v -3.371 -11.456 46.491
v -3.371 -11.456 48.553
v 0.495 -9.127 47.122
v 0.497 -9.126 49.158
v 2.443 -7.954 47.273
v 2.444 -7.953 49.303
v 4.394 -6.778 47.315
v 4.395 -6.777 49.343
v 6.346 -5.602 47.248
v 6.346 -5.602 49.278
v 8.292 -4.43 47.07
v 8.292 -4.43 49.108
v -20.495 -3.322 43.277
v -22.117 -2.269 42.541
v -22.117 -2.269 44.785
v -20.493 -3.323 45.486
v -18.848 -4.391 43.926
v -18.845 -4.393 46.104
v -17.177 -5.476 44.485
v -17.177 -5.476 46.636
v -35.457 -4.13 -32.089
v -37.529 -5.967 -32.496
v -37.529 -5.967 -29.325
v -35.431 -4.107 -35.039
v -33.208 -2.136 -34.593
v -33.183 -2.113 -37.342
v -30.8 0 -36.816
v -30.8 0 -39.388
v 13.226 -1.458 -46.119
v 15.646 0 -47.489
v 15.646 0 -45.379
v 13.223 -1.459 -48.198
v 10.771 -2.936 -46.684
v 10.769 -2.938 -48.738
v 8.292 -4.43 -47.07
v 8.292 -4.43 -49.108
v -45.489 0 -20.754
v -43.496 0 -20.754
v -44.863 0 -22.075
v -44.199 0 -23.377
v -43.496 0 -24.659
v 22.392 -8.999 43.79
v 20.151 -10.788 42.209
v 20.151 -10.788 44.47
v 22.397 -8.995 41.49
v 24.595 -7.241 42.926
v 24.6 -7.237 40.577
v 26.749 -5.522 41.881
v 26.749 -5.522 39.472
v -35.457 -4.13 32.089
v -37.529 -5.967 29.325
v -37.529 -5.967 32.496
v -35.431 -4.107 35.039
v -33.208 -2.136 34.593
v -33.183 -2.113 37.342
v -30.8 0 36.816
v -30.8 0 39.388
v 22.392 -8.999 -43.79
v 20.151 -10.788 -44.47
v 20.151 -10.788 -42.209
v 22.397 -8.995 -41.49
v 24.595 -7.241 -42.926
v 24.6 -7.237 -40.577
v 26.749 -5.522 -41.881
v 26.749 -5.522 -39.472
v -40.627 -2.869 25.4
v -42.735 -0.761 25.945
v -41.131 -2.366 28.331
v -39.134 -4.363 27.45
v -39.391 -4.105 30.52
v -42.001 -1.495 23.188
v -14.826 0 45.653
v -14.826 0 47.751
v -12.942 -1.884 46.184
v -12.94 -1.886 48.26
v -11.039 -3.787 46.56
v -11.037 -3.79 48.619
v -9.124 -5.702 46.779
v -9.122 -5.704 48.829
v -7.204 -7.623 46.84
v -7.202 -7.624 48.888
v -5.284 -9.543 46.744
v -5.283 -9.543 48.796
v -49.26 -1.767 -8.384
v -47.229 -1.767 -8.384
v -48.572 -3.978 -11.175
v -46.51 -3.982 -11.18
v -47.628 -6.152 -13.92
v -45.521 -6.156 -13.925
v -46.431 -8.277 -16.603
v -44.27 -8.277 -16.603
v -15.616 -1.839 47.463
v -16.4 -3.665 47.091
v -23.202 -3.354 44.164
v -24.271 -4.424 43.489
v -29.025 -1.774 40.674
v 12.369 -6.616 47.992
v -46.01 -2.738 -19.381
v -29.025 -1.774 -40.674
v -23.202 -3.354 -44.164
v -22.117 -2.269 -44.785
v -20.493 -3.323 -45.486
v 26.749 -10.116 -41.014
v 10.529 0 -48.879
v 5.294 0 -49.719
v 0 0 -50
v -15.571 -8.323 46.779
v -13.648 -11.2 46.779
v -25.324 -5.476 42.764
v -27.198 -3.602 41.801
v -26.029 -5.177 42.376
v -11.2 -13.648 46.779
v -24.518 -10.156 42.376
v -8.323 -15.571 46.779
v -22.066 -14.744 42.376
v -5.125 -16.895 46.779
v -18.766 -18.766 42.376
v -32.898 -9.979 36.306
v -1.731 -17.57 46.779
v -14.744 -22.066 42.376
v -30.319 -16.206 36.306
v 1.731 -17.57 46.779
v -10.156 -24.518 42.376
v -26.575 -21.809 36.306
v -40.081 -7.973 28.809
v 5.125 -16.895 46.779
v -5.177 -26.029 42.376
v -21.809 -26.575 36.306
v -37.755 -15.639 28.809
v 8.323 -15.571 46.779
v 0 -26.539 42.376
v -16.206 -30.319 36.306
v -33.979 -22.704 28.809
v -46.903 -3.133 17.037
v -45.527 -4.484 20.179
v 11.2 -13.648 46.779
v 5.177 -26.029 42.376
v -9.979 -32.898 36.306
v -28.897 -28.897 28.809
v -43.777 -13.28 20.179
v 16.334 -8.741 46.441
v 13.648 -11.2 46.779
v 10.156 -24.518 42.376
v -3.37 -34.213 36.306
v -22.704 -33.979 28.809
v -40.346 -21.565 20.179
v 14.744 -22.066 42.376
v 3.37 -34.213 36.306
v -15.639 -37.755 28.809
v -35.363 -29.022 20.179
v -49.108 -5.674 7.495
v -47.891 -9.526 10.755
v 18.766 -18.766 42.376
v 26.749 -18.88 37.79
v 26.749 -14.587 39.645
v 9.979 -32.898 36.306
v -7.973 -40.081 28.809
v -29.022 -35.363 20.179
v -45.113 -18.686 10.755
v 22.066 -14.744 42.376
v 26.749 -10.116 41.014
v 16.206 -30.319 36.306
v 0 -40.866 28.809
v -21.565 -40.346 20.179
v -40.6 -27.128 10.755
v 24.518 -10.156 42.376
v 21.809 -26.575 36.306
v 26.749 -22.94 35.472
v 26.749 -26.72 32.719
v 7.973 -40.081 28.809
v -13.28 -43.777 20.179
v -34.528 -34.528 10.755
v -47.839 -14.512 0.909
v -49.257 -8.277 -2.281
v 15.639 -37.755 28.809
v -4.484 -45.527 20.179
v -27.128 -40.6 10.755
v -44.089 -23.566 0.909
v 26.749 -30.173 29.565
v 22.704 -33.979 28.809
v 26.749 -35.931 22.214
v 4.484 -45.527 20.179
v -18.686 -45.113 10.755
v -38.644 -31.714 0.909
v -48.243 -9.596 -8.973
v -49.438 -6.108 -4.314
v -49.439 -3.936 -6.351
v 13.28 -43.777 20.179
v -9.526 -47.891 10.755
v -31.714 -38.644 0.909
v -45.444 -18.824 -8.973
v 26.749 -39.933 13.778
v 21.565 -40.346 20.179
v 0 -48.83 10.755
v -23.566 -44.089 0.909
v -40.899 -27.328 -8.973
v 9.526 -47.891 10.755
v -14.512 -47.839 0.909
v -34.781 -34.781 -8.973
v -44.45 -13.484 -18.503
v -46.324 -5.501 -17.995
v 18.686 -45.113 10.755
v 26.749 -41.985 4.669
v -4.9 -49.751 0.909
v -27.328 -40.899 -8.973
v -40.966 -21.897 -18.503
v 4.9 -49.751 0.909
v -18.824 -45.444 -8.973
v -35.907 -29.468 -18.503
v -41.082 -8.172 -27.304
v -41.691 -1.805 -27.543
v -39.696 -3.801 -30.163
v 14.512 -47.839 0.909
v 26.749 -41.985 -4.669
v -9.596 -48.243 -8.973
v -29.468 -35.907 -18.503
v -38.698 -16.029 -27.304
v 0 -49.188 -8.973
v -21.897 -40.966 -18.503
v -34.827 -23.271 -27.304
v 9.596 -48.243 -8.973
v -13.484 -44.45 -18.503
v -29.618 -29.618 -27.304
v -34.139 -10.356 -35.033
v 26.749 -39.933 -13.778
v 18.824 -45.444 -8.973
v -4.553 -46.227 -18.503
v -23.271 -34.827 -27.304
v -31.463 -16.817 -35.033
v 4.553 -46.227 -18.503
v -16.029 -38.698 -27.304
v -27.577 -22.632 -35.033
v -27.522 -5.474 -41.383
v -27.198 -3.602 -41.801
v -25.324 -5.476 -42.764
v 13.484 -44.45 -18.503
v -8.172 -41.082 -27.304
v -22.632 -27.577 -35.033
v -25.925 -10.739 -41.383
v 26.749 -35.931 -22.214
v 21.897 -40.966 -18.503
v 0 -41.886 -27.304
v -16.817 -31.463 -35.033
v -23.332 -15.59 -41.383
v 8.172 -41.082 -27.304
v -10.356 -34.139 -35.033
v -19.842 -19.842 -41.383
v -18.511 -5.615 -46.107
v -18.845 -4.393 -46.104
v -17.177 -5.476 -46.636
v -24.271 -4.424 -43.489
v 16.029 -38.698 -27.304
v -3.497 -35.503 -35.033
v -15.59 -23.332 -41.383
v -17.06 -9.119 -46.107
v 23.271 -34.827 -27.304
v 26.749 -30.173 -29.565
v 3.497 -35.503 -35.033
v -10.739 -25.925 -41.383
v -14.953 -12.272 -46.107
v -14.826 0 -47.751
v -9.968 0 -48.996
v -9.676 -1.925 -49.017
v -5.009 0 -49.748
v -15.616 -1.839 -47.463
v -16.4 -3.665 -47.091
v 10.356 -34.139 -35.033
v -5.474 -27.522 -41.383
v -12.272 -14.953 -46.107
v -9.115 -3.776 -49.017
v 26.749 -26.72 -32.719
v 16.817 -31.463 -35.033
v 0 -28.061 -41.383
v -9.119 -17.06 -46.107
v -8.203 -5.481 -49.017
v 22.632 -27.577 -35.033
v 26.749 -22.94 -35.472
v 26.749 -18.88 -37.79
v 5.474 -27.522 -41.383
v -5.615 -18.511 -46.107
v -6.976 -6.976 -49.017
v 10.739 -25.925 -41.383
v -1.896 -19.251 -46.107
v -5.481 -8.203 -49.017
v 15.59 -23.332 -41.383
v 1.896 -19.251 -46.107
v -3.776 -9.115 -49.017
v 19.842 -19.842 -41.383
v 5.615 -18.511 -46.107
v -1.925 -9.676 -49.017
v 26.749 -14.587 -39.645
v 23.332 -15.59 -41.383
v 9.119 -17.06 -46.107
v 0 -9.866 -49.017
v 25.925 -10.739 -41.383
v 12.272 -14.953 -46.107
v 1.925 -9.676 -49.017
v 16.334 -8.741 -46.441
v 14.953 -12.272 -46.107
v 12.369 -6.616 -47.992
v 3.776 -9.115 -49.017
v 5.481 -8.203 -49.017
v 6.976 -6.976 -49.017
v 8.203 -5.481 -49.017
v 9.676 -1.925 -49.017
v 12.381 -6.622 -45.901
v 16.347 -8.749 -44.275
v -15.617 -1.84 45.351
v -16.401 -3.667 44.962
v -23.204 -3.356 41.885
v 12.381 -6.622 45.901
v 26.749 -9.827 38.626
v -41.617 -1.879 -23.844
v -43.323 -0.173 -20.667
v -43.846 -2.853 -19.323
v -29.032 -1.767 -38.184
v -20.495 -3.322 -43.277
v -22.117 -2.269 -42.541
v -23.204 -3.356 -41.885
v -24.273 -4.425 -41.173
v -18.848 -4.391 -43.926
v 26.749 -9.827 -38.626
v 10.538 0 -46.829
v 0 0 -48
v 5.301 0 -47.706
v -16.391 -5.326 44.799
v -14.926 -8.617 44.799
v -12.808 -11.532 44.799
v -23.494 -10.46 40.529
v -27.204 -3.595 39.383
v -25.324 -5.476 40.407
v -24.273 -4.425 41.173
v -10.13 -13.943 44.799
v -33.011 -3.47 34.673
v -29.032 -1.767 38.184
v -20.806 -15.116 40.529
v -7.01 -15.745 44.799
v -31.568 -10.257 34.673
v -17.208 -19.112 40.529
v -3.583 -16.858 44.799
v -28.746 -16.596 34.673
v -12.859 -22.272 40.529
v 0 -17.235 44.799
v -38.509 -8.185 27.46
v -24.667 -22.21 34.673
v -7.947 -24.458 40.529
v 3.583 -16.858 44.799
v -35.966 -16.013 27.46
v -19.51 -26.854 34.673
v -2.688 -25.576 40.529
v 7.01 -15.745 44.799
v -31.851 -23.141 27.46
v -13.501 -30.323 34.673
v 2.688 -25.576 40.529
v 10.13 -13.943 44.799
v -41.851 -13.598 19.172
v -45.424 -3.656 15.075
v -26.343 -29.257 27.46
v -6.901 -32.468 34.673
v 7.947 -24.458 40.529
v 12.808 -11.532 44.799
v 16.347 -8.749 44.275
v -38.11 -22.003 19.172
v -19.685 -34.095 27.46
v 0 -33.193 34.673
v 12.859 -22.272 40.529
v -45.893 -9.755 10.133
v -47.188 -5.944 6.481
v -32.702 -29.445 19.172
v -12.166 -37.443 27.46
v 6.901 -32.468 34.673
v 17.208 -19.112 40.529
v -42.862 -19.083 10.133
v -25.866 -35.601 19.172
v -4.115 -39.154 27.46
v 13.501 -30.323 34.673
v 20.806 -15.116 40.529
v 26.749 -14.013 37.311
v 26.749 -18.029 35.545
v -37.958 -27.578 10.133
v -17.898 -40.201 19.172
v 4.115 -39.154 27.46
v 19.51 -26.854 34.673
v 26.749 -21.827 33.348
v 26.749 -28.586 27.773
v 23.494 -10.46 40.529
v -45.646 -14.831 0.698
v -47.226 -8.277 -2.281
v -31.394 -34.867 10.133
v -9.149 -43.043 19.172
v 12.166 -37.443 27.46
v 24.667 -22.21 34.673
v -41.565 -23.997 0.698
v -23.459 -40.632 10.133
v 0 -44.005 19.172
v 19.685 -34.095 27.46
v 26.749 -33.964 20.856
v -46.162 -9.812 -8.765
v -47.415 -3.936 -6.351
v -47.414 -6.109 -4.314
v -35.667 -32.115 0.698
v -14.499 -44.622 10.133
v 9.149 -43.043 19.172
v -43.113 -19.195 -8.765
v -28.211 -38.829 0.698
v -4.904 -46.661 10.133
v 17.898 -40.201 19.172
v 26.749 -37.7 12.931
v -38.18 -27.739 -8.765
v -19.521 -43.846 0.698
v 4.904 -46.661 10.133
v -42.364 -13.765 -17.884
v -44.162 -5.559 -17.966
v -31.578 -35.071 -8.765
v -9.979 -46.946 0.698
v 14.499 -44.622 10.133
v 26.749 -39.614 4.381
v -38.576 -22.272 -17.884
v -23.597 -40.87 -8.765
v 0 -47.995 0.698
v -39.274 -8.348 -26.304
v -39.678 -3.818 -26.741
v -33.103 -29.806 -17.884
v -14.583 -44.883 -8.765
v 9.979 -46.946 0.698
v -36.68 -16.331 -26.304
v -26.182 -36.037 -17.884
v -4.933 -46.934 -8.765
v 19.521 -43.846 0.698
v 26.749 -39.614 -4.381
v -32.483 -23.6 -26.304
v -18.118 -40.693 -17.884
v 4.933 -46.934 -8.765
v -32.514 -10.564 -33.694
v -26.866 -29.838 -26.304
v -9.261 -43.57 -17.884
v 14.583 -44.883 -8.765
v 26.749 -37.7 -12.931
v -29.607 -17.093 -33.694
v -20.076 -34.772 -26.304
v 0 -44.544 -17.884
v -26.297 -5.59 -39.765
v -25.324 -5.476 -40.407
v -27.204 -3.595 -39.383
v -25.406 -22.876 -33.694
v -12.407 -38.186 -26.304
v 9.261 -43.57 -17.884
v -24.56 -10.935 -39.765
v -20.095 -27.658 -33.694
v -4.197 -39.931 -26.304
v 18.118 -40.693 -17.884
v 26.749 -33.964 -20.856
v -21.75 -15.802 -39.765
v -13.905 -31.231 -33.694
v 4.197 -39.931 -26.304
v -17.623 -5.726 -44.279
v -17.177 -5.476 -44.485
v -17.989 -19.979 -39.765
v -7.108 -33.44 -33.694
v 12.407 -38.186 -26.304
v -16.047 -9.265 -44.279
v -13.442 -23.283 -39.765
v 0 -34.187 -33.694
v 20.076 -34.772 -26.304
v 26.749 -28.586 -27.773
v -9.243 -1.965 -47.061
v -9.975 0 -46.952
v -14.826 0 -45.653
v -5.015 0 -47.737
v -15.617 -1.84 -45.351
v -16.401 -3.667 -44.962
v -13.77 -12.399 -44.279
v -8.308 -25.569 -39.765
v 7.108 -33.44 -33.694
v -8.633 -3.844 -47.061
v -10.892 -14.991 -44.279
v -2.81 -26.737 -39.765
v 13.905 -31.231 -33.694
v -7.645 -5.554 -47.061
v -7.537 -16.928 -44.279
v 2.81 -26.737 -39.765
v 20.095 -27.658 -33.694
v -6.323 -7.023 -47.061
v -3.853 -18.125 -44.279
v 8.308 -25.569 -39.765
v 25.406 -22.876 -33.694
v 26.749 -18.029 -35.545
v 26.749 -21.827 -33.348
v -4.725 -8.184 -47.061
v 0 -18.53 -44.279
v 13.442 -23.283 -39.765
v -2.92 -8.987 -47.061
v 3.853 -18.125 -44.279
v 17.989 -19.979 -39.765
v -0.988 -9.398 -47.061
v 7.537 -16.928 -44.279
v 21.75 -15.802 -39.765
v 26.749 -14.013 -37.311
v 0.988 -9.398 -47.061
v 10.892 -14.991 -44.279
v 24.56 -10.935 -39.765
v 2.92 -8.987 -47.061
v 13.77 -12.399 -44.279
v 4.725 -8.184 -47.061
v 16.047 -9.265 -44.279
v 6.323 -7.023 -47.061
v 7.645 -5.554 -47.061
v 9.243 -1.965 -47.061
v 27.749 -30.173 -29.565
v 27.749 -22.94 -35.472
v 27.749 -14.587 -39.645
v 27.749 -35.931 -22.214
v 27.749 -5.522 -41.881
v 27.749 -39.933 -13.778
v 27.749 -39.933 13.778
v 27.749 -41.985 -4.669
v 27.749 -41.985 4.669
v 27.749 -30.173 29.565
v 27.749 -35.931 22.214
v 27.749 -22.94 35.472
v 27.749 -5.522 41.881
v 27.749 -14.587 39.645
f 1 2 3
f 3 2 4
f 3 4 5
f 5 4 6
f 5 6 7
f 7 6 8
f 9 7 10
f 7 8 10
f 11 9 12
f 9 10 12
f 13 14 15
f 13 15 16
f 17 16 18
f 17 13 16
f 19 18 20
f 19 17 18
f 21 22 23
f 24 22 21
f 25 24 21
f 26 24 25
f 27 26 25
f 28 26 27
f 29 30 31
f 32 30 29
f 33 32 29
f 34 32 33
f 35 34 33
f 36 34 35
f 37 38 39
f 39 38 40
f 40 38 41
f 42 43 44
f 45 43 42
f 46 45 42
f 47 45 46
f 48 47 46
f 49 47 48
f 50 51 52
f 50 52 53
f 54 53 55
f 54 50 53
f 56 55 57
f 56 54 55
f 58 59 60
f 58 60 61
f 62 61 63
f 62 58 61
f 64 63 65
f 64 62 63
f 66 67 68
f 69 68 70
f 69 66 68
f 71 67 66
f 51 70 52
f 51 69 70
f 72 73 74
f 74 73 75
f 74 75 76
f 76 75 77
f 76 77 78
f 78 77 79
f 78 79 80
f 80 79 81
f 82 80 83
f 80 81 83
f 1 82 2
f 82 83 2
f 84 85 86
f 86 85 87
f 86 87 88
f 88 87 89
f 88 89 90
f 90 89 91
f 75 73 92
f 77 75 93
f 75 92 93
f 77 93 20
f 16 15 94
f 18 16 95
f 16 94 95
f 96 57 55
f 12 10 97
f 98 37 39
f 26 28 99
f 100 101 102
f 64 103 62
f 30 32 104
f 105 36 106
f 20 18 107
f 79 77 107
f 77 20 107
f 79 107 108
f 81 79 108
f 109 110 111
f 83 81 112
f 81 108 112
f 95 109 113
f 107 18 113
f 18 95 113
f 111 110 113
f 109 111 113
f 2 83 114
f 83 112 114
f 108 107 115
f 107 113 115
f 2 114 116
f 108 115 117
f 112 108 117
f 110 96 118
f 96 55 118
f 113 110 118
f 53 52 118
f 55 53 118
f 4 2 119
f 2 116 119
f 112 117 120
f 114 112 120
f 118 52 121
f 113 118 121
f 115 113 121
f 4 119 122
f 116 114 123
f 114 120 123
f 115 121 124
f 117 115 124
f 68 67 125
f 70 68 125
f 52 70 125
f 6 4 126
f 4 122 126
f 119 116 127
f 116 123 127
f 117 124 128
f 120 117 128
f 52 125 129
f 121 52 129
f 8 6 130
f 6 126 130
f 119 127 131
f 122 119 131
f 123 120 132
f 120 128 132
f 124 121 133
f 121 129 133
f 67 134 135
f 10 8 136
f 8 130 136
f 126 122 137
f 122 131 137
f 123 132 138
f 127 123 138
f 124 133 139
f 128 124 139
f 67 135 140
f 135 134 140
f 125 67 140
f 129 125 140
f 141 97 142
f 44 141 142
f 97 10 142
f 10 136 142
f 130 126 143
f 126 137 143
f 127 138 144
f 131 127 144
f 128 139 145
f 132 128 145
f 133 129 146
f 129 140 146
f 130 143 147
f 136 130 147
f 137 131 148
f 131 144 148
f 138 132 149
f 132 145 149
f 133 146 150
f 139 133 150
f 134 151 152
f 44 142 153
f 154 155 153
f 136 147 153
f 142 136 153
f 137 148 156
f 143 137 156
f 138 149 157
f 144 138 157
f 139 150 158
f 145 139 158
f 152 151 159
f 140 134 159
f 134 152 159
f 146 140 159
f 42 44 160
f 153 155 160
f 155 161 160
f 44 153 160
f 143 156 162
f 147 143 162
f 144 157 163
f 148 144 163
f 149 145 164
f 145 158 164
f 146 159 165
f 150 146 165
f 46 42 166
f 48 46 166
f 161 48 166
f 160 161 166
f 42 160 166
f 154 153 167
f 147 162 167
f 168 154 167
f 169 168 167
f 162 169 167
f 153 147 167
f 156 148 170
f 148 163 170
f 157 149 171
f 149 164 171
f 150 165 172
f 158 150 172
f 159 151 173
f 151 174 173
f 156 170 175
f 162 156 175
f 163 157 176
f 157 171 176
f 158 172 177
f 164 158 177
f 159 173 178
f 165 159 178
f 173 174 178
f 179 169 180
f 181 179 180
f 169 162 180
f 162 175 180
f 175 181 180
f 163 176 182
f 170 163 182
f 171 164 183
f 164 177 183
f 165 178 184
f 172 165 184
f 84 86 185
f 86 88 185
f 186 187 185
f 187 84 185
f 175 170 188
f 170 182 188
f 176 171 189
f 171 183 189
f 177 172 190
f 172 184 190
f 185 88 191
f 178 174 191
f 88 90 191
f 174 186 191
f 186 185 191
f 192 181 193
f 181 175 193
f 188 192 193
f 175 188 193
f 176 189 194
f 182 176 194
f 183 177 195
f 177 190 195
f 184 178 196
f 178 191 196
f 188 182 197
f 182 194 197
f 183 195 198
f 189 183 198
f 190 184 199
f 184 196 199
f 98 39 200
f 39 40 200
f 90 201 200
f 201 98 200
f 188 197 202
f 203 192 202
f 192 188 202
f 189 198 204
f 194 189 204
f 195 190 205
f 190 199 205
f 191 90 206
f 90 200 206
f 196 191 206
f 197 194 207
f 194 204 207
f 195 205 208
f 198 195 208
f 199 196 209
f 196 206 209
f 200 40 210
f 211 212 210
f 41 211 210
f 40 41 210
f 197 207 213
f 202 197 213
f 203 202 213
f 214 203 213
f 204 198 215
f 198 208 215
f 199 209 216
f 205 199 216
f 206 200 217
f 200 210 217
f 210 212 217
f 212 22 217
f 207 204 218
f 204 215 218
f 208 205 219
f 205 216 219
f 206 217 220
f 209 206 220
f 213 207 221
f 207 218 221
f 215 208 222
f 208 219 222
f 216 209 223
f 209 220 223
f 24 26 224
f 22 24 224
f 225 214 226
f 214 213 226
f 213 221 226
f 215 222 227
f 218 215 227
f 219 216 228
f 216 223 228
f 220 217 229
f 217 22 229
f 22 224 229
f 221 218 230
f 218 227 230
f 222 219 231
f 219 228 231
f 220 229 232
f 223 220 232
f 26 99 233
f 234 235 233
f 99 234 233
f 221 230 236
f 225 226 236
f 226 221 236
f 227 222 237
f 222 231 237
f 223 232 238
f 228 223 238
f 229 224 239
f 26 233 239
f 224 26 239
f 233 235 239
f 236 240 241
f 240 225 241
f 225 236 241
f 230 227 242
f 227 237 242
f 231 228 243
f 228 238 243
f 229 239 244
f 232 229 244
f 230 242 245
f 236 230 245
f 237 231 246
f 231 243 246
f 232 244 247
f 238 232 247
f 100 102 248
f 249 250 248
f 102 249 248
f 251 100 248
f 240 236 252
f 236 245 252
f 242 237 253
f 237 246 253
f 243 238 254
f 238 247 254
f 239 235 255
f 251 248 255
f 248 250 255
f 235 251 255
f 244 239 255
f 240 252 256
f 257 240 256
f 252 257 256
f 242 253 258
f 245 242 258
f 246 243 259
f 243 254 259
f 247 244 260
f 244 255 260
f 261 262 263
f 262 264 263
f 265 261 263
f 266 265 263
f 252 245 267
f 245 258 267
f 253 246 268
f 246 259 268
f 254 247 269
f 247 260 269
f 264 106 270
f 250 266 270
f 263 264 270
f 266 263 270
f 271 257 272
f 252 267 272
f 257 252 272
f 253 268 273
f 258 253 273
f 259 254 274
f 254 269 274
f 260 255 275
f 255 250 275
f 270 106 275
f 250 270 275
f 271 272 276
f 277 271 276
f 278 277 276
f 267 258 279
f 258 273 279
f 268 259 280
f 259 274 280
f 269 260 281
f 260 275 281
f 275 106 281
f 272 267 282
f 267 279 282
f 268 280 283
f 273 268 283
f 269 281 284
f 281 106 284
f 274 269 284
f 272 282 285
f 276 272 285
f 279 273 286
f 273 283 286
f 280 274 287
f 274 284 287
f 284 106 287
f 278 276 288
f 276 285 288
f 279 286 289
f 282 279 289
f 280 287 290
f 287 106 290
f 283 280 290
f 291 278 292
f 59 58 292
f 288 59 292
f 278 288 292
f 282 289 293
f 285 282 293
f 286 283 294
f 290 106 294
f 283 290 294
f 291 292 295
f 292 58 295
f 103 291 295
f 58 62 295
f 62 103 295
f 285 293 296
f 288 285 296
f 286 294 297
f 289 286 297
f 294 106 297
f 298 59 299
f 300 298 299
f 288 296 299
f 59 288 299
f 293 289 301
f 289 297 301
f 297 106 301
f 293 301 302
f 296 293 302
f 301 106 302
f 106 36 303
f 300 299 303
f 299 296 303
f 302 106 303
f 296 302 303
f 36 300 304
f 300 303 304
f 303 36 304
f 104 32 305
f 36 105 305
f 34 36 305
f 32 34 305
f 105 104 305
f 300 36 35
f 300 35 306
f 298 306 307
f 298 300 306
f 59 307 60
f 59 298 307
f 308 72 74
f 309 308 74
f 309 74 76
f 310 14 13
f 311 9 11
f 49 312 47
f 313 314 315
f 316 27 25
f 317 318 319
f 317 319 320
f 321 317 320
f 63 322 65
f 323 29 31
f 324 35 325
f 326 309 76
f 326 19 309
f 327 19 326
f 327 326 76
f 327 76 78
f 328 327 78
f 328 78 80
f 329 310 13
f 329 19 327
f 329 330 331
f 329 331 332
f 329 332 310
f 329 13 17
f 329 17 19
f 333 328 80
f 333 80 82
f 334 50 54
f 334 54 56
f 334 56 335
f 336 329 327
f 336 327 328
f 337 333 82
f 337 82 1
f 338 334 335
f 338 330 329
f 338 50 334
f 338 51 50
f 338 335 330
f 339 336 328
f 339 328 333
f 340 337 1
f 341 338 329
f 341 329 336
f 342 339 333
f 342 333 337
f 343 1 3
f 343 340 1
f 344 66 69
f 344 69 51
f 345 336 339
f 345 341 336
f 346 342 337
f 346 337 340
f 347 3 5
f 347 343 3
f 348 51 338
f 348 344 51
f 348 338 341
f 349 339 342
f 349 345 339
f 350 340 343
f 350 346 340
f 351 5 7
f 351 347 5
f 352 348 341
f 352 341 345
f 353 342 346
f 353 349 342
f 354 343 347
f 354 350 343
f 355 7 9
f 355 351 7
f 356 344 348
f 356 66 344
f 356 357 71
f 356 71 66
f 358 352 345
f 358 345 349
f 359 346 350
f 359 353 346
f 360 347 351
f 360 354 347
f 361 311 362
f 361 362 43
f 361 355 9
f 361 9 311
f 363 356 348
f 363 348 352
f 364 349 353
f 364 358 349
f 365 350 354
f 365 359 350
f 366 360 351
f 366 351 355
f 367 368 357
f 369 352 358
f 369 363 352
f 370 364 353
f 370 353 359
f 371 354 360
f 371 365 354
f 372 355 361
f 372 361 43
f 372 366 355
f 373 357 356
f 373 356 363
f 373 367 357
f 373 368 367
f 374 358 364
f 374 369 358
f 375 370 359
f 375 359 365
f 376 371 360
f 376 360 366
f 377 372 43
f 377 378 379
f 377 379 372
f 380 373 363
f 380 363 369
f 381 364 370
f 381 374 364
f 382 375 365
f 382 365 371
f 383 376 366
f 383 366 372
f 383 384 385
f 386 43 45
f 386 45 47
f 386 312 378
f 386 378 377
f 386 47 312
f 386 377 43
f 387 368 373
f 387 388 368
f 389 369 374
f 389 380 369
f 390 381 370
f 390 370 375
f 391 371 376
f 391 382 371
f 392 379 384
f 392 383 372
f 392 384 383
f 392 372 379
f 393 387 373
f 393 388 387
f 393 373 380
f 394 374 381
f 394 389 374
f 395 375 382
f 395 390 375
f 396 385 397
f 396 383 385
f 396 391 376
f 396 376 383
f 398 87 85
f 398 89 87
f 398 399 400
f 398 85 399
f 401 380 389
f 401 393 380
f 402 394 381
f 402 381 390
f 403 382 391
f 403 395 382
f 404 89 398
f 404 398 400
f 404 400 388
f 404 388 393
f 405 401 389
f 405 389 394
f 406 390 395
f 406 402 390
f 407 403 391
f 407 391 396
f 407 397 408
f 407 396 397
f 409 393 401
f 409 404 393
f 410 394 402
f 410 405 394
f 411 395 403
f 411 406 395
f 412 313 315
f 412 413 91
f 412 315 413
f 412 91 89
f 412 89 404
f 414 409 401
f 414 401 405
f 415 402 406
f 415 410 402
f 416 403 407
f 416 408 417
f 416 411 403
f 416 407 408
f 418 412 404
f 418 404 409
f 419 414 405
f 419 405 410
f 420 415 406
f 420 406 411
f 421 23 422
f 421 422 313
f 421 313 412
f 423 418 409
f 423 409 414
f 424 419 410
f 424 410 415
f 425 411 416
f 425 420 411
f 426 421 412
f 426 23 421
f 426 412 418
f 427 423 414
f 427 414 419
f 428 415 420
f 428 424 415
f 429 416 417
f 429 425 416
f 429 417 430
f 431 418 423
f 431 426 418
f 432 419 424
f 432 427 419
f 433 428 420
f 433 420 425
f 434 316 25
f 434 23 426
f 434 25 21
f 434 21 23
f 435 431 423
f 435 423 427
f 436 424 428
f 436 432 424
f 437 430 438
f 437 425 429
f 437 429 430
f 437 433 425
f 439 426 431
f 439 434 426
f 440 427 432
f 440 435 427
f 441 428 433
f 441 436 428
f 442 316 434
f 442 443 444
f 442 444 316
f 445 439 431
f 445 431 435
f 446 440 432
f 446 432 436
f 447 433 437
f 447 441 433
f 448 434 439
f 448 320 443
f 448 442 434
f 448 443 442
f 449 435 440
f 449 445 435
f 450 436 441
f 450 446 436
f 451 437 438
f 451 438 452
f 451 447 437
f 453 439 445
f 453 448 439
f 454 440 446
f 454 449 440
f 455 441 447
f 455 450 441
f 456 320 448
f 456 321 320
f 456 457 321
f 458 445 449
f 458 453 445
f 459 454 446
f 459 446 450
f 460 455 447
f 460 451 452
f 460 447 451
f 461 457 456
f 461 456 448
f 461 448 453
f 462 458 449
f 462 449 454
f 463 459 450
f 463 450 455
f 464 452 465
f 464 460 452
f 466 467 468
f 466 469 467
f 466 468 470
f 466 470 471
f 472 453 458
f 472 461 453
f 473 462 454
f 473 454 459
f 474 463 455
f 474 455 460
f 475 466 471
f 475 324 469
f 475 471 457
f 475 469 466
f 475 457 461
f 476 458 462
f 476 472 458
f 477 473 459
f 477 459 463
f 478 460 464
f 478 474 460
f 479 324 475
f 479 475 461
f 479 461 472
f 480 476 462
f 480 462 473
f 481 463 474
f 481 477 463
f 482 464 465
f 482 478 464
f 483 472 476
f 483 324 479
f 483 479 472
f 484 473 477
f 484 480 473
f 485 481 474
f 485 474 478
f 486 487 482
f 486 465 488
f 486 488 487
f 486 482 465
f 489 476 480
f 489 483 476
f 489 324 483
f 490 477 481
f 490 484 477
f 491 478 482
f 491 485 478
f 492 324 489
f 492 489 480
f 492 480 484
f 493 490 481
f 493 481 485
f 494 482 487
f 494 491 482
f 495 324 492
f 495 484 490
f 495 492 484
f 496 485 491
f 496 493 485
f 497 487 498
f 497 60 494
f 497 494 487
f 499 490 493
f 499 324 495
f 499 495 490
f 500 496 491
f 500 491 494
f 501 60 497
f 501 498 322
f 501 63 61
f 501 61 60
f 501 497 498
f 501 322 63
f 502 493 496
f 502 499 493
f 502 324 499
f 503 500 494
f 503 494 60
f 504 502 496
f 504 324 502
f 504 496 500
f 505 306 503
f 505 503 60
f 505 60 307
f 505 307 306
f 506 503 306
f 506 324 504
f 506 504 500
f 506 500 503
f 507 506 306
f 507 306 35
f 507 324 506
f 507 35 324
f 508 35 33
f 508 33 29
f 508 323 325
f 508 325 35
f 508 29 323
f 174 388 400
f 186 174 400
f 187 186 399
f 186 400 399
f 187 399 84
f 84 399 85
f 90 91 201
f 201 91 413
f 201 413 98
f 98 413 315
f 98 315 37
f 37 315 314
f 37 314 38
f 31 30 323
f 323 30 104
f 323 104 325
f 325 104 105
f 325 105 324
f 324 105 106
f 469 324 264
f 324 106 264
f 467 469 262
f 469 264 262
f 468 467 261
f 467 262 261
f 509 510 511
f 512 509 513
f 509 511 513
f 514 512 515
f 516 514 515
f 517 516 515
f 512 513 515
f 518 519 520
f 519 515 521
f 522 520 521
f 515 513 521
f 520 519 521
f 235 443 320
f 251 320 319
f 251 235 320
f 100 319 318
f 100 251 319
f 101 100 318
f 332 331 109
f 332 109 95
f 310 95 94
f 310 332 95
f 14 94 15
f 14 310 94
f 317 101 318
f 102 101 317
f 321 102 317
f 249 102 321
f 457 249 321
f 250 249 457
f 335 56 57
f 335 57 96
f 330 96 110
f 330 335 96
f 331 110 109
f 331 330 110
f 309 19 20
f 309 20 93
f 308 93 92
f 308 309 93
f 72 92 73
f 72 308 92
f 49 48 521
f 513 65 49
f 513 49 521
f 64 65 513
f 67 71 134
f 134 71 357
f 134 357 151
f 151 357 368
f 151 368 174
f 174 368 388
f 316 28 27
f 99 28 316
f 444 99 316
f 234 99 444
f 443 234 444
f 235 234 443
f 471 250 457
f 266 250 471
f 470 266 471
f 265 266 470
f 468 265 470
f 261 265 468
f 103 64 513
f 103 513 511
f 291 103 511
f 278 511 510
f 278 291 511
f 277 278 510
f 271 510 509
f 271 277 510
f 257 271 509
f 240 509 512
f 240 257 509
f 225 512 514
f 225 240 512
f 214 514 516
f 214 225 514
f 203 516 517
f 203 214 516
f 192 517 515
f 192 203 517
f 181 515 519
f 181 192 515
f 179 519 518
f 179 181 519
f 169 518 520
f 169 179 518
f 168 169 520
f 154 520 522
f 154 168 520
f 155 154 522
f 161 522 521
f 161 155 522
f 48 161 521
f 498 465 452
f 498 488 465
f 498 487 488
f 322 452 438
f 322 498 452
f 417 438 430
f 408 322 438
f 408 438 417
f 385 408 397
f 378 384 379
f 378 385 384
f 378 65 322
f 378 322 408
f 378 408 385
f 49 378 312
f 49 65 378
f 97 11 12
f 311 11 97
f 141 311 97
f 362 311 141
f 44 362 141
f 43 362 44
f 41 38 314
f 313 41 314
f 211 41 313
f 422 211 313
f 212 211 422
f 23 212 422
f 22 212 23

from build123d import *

# Parameters (mm, degrees)
REVOLVE7_ANGLE          = 180
SHELL1_T                = -2
CUT_EXTRUDE1_DEPTH      = 10
CUT_EXTRUDE2_DEPTH      = 123.474487139
CUT_EXTRUDE2_DEPTH_BACK = 123.474487139
CUT_EXTRUDE3_DEPTH      = 123.474487139
CUT_EXTRUDE3_DEPTH_BACK = 123.474487139
CUT_EXTRUDE10_DEPTH     = 150
BOSS_EXTRUDE1_DEPTH     = 1


with BuildPart() as part:
    # Sketch3 → Revolve7 (revolve)
    with BuildSketch(Plane(origin=(0, 0, 0), x_dir=(1, 0, 0), z_dir=(0, 1, 0))):
        with BuildLine():
            Line((0, 50), (0, -50))
            ThreePointArc((0, -50), (-50, 0), (0, 50))
        make_face()
    revolve(axis=Axis((0, 0, -50), (0, 0, 1)), revolution_arc=REVOLVE7_ANGLE)

    # Shell1
    shell1_openings = [part.faces().sort_by_distance(p)[0] for p in [
        (0, 0, 0),
    ]]
    offset(amount=SHELL1_T, openings=shell1_openings)

    # Sketch7 → Cut-Extrude1 (cut)
    with BuildSketch(Plane.XY.offset(50)):
        Polygon((-14.826397907, 0), (-3.370798864, -11.455599042), (15.645535913, 0), align=None)
    extrude(amount=-CUT_EXTRUDE1_DEPTH, mode=Mode.SUBTRACT)

    # Sketch9 → Cut-Extrude2 (cut, two sides: drawn at the far end of the back side and taken through both)
    with BuildSketch(Plane.XY.offset(50).offset(-CUT_EXTRUDE2_DEPTH_BACK)):
        Polygon((8.292044244, -4.429804855), (20.150794945, -10.787955598), (33.666572042, 0), (15.645535913, 0), align=None)
    extrude(amount=CUT_EXTRUDE2_DEPTH + CUT_EXTRUDE2_DEPTH_BACK, mode=Mode.SUBTRACT)

    # Sketch10 → Cut-Extrude3 (cut, two sides: drawn at the far end of the back side and taken through both)
    with BuildSketch(Plane.XY.offset(50).offset(-CUT_EXTRUDE3_DEPTH_BACK)):
        Polygon((-30.799589022, 0), (-43.496228113, 0), (-37.52885371, -5.967374403), align=None)
        Polygon((-14.826397907, 0), (-30.799589022, 0), (-25.323697422, -5.475891599), (-22.116726159, -2.268920336), (-17.177232044, -5.475891599), align=None)
    extrude(amount=CUT_EXTRUDE3_DEPTH + CUT_EXTRUDE3_DEPTH_BACK, mode=Mode.SUBTRACT)

    # Sketch12 → Cut-Extrude10 (cut)
    with BuildSketch(Plane(origin=(50, 0, 0), x_dir=(0, 0, -1), z_dir=(1, 0, 0))):
        Polygon((16.603317185, -8.277154343), (20.753512458, 0), (-28.80470168, 0), (2.281074676, -8.277154343), (8.384303018, -1.767044111), align=None)
    extrude(amount=-CUT_EXTRUDE10_DEPTH, mode=Mode.SUBTRACT)

    # Split1
    split(bisect_by=Plane(origin=(26.748894099, 0, 0), x_dir=(0, 0, 1), z_dir=(1, 0, 0)), keep=Keep.BOTTOM)

    # Sketch15 → Boss-Extrude1 (add)
    with BuildSketch(Plane(origin=(26.748894099, 0, 0), x_dir=(0, 0, -1), z_dir=(1, 0, 0))):
        with BuildLine():
            Line((-41.880896681, -5.521517702), (41.880896681, -5.521517702))
            ThreePointArc((41.880896681, -5.521517702), (0, -42.243303191), (-41.880896681, -5.521517702))
        make_face()
    extrude(amount=BOSS_EXTRUDE1_DEPTH)


solid = part.part
